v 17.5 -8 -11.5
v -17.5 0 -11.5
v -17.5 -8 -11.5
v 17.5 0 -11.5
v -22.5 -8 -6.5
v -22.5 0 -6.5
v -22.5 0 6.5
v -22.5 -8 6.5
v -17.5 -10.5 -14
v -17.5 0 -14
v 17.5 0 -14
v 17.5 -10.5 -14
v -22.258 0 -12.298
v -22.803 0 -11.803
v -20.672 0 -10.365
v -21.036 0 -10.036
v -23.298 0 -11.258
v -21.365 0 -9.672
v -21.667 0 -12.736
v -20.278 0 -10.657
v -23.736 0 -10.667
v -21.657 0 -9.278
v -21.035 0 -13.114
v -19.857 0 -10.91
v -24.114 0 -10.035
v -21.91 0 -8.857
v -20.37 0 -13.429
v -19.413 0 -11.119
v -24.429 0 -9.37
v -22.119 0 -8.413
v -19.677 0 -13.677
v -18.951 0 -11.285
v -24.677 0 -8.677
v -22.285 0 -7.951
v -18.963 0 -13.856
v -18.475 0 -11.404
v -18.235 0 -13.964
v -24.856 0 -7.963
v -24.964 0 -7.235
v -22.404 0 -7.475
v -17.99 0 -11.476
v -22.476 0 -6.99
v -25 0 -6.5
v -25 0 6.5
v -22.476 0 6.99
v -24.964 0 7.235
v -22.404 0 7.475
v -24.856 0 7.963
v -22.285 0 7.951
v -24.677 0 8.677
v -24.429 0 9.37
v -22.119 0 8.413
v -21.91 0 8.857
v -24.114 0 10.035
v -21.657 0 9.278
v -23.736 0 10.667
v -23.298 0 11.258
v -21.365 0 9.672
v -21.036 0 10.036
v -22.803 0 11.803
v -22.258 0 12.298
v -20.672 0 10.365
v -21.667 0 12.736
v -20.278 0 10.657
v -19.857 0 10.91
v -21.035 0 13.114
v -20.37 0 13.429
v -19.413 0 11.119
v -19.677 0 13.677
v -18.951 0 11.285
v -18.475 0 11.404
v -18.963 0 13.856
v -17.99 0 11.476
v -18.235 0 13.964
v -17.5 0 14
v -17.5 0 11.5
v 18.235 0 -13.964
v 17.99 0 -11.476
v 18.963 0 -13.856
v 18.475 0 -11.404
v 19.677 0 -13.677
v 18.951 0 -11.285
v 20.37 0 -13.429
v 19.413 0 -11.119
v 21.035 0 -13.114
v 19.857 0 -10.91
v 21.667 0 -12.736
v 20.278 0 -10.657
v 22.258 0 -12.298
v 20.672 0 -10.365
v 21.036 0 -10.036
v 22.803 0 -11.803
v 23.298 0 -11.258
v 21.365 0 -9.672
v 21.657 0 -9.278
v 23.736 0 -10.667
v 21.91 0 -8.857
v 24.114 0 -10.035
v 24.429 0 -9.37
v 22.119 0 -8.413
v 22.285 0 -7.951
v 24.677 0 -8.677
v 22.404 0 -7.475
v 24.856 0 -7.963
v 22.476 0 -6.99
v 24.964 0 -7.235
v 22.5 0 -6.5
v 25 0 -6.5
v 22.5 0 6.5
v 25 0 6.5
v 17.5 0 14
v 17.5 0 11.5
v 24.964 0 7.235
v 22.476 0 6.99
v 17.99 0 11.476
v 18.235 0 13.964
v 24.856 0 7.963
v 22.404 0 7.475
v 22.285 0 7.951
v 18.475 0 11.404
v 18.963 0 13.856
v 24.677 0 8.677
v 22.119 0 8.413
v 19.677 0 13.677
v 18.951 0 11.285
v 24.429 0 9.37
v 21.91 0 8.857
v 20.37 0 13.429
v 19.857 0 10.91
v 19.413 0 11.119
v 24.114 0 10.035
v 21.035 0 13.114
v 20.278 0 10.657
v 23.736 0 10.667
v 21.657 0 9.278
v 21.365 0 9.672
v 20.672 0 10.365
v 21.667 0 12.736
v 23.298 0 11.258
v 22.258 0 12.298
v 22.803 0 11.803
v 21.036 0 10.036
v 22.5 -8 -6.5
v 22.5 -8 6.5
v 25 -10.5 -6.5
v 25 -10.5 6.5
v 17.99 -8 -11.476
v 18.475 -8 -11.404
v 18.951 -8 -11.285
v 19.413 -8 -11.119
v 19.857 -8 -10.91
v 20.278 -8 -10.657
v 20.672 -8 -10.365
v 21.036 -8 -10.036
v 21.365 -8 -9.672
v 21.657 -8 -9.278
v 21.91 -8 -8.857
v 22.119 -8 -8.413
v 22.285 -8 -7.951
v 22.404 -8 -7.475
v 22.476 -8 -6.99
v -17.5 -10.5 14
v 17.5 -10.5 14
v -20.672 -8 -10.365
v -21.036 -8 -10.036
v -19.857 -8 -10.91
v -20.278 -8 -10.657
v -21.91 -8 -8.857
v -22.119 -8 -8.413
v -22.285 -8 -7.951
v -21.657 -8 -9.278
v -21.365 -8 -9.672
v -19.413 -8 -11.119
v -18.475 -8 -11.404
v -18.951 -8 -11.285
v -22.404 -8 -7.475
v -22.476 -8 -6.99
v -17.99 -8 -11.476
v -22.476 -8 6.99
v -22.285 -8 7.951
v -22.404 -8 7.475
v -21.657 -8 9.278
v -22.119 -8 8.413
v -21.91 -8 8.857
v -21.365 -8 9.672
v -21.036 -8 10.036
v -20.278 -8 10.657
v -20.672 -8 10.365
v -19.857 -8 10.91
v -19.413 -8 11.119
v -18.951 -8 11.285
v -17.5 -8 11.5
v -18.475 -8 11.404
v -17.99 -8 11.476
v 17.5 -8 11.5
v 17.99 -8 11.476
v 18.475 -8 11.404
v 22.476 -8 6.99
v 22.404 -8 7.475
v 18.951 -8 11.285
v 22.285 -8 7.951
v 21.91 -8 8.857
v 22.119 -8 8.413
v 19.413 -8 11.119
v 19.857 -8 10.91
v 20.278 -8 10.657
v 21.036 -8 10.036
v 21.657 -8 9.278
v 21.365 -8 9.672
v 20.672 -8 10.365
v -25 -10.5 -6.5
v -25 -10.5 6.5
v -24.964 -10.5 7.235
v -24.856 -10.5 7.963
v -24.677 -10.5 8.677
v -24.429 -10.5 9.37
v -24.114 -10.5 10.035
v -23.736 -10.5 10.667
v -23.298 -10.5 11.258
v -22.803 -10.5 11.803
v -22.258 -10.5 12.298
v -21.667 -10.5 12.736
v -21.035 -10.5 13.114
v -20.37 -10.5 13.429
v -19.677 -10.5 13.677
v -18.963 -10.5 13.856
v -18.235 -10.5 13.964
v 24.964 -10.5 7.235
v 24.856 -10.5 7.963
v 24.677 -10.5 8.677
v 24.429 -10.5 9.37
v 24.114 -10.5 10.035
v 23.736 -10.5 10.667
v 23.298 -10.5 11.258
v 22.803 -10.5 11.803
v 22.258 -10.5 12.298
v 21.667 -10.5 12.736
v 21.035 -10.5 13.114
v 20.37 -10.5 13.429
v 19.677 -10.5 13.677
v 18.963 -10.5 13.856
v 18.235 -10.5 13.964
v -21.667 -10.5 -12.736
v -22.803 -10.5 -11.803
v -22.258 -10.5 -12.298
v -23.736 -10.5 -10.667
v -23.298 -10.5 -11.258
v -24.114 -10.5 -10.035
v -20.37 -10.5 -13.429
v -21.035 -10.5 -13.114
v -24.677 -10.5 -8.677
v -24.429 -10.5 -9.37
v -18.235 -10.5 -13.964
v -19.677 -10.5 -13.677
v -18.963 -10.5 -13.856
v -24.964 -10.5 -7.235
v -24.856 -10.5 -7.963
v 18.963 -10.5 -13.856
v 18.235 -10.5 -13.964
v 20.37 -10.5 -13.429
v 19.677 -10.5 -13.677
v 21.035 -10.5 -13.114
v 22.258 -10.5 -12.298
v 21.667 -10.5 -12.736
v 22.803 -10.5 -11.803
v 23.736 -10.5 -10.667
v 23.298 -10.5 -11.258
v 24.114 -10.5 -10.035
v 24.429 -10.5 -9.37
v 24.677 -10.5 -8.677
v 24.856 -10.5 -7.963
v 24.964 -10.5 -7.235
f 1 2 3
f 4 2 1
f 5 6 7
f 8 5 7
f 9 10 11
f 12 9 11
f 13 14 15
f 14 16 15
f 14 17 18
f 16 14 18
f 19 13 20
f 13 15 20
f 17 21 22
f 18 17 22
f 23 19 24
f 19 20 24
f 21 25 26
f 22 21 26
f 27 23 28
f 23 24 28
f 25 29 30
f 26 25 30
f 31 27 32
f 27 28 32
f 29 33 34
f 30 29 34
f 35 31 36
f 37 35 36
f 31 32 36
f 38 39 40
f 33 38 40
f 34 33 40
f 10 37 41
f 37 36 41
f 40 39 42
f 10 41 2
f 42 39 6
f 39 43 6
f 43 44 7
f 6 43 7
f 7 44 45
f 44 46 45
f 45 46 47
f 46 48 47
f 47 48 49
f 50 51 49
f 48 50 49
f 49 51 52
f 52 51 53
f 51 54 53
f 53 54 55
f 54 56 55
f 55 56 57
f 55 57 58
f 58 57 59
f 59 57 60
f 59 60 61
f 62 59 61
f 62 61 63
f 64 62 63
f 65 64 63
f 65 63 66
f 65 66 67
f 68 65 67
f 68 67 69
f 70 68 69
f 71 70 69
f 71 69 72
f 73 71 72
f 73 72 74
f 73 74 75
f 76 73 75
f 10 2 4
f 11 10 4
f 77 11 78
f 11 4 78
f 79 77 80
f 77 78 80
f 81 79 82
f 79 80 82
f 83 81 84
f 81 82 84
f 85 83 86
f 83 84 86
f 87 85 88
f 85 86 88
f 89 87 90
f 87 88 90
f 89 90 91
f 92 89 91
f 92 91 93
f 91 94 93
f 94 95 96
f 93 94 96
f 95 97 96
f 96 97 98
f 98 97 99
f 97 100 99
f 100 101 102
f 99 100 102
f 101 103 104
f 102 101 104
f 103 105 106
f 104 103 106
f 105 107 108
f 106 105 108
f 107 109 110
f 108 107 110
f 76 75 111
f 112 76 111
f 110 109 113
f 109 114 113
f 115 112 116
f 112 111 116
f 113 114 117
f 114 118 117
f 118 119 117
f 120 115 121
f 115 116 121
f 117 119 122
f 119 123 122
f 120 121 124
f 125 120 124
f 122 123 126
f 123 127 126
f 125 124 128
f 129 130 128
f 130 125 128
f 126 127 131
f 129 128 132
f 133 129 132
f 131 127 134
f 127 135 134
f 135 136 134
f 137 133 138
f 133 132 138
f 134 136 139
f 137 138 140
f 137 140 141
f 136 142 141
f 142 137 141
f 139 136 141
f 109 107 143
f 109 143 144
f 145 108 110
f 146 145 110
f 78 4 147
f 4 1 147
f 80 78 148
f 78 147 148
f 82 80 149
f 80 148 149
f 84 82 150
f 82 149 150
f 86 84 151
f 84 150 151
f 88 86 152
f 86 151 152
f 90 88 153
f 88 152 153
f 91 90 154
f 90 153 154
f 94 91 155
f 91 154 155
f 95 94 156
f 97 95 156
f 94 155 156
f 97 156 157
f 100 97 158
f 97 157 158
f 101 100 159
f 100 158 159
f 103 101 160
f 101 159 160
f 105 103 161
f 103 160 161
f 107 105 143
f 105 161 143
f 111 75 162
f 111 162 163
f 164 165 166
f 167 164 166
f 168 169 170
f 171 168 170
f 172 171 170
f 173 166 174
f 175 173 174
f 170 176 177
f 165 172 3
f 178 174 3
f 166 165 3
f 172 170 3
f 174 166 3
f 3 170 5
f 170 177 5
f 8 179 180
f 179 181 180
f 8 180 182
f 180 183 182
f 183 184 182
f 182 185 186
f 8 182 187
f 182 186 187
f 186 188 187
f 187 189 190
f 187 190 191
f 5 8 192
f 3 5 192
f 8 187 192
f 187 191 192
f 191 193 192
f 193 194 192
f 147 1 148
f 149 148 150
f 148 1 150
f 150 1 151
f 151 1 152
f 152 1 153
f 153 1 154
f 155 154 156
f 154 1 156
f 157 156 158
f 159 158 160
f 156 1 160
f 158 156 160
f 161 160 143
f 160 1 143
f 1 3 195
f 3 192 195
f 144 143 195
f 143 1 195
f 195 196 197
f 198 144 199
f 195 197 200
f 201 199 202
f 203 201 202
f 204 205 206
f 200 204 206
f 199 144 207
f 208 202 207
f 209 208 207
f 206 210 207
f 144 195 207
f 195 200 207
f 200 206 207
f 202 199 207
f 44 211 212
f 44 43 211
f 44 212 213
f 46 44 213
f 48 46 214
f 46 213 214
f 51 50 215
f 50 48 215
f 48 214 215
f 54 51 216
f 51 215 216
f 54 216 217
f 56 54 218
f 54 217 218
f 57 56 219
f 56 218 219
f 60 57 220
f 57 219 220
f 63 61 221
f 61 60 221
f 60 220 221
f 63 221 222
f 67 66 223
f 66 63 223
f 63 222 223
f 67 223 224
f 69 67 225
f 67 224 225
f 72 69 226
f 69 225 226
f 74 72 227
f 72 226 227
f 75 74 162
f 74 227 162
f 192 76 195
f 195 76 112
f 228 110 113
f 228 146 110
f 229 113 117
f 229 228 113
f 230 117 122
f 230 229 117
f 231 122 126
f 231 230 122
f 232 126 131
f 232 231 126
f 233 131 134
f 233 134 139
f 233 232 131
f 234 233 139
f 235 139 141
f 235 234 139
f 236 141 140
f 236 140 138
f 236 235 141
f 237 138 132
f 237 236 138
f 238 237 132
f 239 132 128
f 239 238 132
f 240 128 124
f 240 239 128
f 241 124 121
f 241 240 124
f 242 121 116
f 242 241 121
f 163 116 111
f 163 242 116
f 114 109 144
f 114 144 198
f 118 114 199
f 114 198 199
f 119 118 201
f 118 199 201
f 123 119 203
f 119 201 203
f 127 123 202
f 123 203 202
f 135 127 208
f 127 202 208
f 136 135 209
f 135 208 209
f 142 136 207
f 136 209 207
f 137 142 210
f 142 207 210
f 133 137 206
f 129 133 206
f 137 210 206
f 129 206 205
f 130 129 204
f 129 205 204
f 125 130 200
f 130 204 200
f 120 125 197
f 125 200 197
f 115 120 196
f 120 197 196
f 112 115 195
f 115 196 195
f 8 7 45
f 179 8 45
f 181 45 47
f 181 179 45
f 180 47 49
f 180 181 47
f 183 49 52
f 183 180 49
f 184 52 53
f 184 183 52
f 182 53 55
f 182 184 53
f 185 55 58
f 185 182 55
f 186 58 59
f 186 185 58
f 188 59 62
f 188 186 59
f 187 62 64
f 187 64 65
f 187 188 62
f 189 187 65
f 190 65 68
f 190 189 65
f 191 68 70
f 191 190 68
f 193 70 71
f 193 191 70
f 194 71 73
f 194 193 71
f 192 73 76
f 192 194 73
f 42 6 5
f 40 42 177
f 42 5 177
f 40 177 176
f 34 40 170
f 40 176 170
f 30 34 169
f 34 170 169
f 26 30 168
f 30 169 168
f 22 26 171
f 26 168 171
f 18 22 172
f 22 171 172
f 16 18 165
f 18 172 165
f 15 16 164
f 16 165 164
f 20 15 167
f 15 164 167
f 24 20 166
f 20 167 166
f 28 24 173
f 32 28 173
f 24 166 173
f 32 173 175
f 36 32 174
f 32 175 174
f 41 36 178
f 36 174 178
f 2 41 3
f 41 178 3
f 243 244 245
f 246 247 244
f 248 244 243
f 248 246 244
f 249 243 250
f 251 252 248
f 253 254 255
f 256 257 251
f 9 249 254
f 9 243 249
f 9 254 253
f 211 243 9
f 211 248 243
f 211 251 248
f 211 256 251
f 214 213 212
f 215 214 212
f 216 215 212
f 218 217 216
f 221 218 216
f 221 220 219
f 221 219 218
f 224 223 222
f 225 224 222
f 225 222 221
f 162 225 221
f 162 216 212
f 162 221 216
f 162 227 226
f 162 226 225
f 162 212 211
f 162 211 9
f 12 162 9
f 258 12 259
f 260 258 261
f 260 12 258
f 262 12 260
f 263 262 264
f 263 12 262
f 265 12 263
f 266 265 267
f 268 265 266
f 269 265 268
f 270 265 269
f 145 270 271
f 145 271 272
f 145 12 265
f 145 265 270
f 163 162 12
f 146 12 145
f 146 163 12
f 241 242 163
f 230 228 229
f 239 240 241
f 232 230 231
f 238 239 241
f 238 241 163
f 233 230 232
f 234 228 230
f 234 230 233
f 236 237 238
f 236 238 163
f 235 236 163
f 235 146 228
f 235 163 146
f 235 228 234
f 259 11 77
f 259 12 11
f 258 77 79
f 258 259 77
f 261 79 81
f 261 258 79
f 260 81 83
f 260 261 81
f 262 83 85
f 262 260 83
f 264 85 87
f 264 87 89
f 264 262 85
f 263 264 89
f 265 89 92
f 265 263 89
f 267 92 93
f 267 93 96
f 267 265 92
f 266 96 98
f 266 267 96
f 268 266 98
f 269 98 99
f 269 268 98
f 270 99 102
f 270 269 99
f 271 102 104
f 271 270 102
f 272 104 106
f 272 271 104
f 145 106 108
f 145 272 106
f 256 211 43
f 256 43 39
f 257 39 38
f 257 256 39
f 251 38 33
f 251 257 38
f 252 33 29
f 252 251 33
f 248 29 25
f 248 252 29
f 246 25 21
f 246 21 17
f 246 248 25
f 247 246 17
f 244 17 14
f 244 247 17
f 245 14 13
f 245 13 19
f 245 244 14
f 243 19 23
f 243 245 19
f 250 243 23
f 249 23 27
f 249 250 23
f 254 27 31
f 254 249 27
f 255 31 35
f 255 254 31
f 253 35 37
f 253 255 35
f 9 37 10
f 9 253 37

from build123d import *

# Parameters (mm, degrees)
F0_W     = 45
F0_H     = 23
F1_DEPTH = 8
F2_R     = 5
F3_T     = 2.5


with BuildPart() as f1:
    # F0 (on Front) → F1 (new body)
    with BuildSketch(Plane.XZ):
        Rectangle(F0_W, F0_H)
    extrude(amount=F1_DEPTH)

    # F2
    f2_edges = [f1.edges().sort_by_distance(p)[0] for p in [
        (22.5, -4, 11.5),
        (-22.5, -4, 11.5),
        (22.5, -4, -11.5),
        (-22.5, -4, -11.5),
    ]]
    fillet(f2_edges, radius=F2_R)

    # F3
    f3_openings = [f1.faces().sort_by_distance(p)[0] for p in [
        (0, 0, 0),
    ]]
    offset(amount=F3_T, openings=f3_openings, kind=Kind.INTERSECTION)


solid = f1.part
